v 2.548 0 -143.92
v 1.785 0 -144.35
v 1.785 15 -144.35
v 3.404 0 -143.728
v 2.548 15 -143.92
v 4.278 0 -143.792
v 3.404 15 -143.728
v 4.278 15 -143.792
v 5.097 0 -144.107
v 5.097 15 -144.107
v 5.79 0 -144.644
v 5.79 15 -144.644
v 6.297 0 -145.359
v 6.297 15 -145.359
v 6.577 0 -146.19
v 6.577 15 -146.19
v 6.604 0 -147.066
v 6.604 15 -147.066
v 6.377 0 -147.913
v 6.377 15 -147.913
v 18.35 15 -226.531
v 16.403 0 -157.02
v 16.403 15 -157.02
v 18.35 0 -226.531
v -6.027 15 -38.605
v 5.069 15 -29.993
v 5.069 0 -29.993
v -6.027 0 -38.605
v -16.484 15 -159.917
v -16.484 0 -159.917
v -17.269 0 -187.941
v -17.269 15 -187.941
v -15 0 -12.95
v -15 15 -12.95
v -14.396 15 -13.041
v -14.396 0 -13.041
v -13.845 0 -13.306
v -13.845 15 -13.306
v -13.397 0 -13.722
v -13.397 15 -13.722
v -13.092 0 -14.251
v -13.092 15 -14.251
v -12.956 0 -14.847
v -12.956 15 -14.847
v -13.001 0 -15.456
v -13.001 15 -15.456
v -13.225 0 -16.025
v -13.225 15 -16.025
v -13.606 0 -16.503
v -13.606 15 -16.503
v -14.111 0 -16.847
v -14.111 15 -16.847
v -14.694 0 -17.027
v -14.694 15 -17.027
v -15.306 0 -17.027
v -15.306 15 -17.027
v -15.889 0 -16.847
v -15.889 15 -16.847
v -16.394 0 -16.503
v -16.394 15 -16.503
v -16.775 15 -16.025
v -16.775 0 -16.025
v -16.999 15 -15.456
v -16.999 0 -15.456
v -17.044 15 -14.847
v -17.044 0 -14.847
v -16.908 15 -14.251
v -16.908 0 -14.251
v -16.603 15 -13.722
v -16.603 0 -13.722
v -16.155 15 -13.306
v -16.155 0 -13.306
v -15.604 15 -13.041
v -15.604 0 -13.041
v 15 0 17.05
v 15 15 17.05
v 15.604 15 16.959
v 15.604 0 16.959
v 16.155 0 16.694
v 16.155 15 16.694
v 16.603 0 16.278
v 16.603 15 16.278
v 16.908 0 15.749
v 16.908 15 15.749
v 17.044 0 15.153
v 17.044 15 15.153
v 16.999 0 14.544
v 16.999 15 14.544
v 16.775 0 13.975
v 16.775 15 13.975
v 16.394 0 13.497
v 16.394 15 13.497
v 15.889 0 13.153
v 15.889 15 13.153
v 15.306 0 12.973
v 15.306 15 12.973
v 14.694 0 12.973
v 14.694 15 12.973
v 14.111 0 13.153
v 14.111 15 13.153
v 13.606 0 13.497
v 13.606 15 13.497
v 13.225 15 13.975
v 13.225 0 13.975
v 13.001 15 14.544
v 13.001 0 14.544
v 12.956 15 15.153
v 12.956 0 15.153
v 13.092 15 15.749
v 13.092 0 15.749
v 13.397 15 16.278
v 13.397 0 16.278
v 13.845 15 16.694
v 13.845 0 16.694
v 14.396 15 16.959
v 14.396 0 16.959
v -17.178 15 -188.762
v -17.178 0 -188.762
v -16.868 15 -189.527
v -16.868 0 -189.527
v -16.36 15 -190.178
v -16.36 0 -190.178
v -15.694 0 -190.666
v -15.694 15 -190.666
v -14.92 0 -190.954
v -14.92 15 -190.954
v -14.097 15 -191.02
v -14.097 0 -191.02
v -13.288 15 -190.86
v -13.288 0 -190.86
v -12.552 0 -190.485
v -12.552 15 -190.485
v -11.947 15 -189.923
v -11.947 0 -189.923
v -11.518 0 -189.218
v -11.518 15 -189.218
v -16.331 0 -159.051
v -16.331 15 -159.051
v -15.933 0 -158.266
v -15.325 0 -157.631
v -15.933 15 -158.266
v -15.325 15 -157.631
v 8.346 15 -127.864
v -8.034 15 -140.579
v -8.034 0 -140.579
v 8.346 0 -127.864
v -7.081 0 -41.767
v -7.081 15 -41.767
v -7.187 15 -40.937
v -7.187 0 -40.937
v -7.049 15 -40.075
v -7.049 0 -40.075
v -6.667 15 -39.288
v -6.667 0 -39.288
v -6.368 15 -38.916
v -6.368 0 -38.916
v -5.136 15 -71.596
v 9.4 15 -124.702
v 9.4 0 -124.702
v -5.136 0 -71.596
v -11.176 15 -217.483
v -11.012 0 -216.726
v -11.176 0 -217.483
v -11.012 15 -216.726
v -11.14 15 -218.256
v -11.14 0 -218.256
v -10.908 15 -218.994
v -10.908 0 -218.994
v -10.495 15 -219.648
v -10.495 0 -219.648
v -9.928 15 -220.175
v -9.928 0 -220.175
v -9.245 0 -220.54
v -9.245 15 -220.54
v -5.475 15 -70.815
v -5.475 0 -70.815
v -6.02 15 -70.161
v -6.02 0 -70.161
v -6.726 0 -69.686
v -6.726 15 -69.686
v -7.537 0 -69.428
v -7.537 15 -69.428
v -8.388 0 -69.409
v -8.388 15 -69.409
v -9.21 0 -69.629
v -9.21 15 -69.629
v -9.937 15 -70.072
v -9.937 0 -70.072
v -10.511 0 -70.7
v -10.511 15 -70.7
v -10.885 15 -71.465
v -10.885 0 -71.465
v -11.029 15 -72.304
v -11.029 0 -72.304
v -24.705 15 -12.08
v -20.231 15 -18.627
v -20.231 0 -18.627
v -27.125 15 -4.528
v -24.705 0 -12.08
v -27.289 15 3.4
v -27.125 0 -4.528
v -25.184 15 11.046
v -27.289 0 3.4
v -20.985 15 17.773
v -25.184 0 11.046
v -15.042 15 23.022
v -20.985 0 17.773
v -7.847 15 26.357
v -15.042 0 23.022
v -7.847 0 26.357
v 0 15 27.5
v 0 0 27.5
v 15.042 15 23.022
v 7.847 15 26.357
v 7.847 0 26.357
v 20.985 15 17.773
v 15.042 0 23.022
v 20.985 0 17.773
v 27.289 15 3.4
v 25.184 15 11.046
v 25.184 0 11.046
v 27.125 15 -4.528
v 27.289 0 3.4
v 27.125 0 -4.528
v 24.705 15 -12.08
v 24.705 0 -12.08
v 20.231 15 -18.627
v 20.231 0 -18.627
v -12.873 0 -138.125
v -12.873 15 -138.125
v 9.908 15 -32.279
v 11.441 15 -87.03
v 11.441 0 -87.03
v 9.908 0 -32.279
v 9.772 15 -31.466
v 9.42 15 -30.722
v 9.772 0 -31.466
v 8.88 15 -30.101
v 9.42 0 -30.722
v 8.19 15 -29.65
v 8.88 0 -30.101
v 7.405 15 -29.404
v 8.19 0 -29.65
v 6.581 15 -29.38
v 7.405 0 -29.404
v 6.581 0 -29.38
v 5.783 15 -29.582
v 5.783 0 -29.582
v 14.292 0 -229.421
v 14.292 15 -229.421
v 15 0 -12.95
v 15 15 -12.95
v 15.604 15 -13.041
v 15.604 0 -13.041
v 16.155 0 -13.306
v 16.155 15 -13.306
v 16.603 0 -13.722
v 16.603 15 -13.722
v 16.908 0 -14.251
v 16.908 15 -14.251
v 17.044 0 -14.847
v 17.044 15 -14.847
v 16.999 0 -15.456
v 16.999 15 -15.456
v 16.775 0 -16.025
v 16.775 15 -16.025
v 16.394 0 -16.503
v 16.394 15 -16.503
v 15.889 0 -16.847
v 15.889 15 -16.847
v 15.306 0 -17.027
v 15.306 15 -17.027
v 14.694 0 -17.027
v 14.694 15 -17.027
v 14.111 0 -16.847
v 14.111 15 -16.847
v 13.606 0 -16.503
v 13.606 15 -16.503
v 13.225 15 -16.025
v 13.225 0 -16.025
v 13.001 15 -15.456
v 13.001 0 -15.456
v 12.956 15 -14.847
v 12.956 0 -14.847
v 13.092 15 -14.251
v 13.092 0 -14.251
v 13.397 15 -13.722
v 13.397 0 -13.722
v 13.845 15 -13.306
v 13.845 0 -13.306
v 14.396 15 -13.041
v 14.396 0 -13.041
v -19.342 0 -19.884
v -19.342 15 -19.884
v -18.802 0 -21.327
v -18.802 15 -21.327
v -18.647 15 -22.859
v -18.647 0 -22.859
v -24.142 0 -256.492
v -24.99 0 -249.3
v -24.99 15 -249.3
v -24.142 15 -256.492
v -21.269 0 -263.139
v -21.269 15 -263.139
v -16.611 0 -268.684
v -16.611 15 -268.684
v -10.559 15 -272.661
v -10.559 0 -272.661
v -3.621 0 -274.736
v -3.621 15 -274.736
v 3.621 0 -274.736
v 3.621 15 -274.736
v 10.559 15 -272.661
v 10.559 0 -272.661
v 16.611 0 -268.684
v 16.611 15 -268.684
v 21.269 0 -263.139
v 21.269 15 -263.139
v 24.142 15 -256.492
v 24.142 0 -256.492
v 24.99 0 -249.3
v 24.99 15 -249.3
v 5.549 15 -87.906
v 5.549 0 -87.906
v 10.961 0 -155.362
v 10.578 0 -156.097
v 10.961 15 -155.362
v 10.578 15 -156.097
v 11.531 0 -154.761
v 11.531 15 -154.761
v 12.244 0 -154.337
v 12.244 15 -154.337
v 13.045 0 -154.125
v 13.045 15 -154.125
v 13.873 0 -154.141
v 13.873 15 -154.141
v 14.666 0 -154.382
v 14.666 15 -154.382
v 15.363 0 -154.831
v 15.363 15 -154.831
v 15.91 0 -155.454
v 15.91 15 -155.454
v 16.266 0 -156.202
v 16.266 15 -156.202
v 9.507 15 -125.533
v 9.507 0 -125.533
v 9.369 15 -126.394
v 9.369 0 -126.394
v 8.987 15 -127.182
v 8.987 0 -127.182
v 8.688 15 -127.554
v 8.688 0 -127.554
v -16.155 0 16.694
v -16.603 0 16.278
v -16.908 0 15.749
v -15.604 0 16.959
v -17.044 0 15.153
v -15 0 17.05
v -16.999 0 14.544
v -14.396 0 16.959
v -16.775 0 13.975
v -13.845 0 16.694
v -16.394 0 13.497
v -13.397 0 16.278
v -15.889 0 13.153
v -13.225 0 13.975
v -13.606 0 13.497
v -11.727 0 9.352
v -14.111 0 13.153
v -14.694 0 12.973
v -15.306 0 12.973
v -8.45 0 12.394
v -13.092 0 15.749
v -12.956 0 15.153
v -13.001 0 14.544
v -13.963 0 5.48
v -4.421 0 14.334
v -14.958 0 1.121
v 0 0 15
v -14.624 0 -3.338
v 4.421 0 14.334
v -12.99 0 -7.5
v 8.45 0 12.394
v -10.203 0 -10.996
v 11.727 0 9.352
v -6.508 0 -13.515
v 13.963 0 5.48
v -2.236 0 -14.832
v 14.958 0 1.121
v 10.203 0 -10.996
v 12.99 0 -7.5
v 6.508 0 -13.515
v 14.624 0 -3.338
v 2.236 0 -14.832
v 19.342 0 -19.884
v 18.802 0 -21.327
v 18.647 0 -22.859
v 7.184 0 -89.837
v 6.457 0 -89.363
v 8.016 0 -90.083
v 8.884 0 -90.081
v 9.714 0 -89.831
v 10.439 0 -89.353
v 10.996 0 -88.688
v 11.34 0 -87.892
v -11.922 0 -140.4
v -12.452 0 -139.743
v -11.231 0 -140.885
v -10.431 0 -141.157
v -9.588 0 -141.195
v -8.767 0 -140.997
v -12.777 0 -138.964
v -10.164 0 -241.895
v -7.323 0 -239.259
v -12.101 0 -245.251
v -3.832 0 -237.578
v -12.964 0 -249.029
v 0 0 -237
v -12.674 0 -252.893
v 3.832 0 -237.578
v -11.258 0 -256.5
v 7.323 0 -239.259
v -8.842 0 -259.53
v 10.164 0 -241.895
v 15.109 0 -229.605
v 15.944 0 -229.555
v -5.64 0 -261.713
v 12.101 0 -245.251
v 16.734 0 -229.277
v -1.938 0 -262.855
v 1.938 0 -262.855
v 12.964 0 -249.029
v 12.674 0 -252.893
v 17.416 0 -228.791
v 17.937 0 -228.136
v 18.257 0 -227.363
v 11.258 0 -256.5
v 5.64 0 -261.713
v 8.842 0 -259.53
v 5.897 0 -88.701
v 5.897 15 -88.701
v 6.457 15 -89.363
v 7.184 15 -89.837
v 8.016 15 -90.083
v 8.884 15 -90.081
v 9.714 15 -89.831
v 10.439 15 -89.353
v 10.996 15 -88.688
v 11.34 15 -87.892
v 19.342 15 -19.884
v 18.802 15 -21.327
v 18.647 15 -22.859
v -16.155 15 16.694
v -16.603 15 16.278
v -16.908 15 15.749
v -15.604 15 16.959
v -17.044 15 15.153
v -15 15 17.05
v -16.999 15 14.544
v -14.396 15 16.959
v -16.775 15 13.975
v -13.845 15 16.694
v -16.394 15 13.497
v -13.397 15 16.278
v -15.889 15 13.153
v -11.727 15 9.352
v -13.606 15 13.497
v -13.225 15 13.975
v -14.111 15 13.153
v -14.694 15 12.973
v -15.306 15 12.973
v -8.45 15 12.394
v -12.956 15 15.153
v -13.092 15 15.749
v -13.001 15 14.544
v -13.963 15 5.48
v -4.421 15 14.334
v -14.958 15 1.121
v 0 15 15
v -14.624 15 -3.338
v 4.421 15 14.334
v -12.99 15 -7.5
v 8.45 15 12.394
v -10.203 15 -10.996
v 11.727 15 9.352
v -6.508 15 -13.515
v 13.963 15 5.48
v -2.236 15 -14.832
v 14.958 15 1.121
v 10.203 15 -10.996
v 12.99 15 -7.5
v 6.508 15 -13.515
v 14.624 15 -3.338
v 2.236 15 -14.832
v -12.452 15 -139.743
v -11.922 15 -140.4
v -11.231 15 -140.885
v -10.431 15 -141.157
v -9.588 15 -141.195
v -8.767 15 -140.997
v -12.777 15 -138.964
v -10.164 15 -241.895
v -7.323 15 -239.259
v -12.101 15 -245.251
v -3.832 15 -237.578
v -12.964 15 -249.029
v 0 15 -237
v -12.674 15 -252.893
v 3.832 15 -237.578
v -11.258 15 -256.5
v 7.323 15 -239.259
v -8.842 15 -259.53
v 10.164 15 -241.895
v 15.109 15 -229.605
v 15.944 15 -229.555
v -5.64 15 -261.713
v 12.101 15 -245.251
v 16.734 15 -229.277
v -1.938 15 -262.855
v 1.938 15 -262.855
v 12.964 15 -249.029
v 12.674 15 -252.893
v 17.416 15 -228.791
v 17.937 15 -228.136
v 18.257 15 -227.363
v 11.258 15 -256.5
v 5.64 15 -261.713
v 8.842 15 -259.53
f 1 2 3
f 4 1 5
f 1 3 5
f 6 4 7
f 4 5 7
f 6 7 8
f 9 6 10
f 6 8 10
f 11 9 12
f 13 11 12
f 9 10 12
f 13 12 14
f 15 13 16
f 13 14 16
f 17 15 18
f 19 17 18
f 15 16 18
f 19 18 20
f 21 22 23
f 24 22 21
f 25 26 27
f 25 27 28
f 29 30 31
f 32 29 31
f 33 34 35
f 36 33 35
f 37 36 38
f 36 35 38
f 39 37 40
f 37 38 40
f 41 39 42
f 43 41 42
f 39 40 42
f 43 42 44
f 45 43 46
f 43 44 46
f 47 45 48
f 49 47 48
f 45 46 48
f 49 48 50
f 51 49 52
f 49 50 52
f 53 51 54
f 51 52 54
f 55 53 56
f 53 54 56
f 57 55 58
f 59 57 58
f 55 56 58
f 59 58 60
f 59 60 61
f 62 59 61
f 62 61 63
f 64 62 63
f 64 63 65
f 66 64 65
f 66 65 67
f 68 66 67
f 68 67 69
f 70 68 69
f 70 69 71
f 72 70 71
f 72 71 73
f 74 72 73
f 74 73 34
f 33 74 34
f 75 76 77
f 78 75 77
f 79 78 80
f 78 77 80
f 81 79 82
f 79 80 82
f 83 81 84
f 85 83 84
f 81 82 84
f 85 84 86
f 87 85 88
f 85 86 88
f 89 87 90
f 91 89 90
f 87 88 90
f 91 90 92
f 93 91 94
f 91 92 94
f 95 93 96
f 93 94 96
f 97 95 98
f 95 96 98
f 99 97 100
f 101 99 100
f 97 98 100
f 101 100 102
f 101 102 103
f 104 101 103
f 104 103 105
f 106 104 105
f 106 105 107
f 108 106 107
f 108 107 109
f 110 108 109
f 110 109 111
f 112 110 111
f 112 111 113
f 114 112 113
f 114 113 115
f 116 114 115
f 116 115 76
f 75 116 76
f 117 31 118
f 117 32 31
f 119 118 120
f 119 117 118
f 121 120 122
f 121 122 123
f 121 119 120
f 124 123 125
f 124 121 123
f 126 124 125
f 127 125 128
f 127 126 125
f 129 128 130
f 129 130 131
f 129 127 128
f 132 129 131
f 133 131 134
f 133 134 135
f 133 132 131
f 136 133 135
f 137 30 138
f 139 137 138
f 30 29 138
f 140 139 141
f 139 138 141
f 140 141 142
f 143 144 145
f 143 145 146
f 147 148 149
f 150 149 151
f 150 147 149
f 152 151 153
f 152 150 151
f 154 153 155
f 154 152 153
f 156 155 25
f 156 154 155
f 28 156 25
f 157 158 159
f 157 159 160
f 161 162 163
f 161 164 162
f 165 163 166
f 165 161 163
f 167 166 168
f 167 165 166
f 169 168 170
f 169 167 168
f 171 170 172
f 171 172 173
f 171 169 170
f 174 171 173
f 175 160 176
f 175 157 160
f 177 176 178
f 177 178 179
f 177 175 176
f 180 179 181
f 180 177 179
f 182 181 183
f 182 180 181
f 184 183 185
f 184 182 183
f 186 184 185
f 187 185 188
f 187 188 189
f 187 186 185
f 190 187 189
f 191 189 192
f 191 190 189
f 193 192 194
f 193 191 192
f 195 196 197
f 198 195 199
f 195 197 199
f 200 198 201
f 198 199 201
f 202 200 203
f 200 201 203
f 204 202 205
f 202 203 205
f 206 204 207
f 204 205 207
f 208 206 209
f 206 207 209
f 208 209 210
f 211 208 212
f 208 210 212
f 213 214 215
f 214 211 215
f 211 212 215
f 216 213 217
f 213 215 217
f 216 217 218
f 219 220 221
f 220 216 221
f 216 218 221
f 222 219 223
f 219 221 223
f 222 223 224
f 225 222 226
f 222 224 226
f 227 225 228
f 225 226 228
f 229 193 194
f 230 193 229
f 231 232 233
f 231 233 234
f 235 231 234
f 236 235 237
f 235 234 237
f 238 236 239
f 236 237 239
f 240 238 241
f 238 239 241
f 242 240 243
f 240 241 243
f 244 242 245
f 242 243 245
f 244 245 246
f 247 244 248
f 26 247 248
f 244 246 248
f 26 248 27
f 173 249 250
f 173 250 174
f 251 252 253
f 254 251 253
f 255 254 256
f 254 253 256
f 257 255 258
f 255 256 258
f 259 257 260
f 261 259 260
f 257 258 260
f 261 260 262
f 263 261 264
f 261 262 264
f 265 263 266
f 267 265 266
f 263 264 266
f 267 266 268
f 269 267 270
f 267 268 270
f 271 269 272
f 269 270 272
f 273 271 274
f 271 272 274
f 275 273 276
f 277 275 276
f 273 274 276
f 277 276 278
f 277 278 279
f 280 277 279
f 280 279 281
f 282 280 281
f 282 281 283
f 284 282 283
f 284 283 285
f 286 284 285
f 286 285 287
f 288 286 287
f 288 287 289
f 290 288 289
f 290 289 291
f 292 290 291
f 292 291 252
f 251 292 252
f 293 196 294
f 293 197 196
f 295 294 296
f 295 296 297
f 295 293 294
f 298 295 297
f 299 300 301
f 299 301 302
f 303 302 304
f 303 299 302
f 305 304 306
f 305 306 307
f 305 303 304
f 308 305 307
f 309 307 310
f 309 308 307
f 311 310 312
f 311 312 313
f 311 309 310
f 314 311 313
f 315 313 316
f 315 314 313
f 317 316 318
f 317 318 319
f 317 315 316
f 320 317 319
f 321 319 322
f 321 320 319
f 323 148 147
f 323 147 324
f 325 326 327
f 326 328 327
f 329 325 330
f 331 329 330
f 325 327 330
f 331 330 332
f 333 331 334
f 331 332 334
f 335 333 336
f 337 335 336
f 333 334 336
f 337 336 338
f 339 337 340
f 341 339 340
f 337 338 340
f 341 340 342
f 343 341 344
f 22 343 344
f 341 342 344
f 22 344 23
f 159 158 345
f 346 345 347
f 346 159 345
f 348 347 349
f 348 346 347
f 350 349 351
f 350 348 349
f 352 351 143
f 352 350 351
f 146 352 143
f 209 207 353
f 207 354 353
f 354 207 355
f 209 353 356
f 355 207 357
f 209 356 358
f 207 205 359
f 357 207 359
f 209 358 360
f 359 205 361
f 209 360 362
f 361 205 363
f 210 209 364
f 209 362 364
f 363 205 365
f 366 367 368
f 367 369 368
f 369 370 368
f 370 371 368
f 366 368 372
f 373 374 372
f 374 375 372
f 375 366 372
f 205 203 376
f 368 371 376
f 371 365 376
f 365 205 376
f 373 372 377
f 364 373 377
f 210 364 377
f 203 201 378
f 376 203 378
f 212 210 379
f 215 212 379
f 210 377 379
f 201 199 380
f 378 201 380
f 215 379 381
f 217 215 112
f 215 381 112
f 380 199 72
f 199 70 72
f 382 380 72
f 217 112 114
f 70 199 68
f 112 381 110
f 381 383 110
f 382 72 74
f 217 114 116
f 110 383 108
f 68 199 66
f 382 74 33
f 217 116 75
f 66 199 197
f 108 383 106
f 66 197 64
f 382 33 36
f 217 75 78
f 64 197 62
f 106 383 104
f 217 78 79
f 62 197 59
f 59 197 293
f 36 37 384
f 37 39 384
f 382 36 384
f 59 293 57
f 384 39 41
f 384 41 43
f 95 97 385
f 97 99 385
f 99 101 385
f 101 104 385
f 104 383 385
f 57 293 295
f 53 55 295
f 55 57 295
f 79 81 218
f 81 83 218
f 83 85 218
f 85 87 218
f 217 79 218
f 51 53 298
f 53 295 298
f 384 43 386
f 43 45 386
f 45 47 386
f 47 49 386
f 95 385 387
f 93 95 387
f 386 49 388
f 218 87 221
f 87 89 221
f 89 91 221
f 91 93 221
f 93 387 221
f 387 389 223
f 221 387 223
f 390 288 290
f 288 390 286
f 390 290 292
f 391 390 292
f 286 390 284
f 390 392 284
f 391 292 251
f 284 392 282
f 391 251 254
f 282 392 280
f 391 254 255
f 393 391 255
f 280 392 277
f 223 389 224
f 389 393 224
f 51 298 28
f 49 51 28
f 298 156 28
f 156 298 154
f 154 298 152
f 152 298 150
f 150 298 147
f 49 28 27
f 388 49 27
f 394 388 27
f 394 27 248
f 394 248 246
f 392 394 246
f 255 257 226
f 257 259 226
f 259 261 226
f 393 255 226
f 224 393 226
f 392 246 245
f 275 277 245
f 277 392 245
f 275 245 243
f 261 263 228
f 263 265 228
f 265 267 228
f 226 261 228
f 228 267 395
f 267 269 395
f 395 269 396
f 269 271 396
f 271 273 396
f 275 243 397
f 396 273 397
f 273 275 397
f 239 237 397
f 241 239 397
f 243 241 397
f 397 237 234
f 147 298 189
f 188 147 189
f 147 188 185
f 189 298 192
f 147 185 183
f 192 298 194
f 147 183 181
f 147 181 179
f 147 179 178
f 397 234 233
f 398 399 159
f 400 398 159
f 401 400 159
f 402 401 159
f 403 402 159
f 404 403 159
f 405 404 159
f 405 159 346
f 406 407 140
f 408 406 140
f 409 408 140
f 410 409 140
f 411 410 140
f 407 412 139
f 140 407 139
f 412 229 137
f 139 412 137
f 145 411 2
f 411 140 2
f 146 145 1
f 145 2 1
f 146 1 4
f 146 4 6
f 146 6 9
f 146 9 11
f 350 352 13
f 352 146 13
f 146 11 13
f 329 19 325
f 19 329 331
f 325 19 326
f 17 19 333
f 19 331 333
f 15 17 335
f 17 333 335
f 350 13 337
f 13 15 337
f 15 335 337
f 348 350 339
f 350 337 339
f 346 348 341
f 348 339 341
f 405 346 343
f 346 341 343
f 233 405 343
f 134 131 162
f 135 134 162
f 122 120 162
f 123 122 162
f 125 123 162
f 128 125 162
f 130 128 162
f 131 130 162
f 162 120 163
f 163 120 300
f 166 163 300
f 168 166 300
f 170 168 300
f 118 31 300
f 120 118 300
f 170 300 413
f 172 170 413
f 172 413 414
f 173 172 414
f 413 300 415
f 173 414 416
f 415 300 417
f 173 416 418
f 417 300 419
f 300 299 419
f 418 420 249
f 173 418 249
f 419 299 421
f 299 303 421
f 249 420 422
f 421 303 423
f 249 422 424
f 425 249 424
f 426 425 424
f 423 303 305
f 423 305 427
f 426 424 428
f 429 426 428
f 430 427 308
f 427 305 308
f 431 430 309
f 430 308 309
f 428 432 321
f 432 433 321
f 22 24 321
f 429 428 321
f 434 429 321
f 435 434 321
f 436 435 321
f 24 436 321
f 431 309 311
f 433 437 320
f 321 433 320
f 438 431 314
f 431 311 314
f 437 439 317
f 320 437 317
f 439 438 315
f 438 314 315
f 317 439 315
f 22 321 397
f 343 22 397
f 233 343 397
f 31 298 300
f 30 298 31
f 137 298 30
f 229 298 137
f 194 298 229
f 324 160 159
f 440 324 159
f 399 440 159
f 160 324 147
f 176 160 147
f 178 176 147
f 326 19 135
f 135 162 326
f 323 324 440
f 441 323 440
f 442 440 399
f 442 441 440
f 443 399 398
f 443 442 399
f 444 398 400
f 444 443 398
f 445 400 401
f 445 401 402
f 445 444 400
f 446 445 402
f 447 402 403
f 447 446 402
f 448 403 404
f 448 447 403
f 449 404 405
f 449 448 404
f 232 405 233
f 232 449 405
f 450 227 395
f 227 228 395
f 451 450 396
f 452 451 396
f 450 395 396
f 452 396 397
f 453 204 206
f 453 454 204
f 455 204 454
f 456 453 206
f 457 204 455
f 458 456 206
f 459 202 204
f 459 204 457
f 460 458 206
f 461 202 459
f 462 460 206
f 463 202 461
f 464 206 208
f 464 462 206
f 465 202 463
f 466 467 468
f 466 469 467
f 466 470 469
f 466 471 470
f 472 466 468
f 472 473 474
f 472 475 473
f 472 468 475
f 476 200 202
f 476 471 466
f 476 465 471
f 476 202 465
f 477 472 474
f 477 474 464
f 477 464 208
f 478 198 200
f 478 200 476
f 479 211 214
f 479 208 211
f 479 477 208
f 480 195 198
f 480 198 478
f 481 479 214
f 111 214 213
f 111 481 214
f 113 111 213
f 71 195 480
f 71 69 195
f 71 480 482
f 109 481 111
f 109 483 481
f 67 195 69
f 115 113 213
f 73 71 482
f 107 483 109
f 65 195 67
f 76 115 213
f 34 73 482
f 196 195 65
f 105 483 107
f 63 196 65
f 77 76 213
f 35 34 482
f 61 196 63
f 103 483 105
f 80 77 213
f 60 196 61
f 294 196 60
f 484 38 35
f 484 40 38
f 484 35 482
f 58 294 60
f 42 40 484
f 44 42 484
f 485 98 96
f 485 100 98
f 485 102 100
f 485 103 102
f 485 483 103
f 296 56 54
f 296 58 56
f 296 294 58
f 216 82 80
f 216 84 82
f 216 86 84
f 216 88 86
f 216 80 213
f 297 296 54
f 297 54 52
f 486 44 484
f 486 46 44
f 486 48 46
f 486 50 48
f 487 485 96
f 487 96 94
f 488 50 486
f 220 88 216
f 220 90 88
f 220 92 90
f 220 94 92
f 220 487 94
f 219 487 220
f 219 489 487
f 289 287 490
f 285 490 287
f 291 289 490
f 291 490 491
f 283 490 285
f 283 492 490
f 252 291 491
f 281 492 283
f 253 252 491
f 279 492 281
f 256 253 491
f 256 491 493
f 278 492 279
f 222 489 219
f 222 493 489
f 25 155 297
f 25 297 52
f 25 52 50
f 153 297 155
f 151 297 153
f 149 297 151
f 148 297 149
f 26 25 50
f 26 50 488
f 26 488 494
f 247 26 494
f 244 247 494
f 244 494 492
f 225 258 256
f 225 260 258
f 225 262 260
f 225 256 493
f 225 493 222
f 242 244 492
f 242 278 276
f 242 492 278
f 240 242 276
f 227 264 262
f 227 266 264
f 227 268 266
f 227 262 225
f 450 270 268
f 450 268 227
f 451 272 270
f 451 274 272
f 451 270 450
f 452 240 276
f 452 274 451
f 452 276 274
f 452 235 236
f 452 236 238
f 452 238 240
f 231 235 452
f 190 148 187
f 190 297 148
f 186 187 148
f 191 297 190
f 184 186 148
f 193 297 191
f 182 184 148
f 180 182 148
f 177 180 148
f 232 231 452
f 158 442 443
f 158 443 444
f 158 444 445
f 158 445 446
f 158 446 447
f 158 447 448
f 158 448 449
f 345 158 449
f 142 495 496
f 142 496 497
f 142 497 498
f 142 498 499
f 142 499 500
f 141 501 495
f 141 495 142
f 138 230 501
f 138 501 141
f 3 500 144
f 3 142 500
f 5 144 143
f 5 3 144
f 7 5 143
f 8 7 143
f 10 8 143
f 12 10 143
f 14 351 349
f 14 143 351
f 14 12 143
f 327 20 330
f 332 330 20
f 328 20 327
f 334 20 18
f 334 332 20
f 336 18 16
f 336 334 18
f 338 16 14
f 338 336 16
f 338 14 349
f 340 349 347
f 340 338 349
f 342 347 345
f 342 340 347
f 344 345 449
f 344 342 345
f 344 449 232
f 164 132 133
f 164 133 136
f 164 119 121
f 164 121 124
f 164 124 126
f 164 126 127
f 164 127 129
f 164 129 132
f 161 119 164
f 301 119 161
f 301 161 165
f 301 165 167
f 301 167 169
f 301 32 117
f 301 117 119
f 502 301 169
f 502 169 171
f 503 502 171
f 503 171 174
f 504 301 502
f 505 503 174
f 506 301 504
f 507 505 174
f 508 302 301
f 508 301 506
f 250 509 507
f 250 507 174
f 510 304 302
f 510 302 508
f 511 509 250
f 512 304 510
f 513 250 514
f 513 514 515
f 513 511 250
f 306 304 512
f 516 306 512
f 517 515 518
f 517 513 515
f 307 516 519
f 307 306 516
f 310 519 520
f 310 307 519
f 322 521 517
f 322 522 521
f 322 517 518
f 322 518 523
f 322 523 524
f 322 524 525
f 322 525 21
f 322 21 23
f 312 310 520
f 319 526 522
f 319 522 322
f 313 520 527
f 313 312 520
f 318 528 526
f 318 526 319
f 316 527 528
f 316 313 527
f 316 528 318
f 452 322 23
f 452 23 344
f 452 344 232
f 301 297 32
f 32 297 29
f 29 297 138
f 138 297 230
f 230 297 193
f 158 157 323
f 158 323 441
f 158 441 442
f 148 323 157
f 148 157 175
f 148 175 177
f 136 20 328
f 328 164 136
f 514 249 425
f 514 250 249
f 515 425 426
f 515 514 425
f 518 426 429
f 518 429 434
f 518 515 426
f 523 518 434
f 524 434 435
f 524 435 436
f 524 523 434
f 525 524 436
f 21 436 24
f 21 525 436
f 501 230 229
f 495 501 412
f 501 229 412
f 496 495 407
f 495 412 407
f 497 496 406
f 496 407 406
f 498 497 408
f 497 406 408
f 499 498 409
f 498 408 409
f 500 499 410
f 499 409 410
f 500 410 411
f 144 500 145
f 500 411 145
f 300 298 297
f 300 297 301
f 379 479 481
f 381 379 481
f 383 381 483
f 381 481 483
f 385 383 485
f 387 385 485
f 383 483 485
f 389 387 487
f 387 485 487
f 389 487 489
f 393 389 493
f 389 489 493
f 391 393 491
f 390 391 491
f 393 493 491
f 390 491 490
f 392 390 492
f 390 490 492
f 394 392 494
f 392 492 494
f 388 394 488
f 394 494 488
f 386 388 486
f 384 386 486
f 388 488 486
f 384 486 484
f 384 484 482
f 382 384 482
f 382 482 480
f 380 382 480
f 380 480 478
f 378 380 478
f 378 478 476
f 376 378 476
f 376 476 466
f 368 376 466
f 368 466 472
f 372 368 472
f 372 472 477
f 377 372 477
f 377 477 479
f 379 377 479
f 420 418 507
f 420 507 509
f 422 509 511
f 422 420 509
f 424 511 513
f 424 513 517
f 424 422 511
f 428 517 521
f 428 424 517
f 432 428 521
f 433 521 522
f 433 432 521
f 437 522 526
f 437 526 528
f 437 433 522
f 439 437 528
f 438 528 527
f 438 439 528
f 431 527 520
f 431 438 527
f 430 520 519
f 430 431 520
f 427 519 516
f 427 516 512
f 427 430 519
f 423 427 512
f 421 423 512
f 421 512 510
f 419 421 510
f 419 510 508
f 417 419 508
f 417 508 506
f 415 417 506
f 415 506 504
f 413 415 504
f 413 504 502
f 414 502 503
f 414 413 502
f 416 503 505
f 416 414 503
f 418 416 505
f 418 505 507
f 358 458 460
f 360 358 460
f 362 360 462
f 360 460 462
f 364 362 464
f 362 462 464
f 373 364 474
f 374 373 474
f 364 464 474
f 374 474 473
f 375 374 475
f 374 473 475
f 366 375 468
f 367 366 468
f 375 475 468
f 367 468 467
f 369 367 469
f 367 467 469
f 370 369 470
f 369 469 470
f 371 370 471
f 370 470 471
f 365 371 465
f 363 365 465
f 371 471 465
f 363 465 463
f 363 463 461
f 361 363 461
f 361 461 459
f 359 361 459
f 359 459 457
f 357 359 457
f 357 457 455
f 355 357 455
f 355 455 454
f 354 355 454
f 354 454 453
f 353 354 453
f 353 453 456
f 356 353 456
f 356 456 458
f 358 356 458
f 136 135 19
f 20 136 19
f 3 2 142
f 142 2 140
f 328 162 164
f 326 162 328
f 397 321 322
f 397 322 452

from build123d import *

# Parameters (mm, degrees)
SKETCH_1_R          = 5.05
SKETCH_1_R_2        = 13
EXTRUDE_1_DEPTH     = 15
FILLET_1_R          = 3
CUT_EXTRUDE_3_DEPTH = 277.54113618
FILLET_2_R          = 3
EXTRUDE_START       = -15
SKETCH_5_R          = 27.5
SKETCH_5_R_2        = 5.05
EXTRUDE_2_DEPTH     = 15
FILLET_3_R          = 6
EXTRUDE_3_DEPTH     = 15
FILLET_4_R          = 3
SKETCH_7_R          = 2.05
CUT_EXTRUDE_4_DEPTH = 277.778340916
SKETCH_8_R          = 15
CUT_EXTRUDE_5_DEPTH = 277.778340916


with BuildPart() as part:
    # 草图1 → 凸台-拉伸1 (new body)
    with BuildSketch(Plane(origin=(0, 0, 0), x_dir=(1, 0, 0), z_dir=(0, 1, 0))):
        with BuildLine():
            Line((-17.992942616, -0.504), (-24.990198078, 249.3))
            ThreePointArc((-24.990198078, 249.3), (0, 275), (24.990198078, 249.3))
            Line((24.990198078, 249.3), (17.992942616, -0.504))
            ThreePointArc((17.992942616, -0.504), (0, -18), (-17.992942616, -0.504))
        make_face()
        with Locations(Location((0, 0, 0), (0, 0, 270))):
            Circle(SKETCH_1_R, mode=Mode.SUBTRACT)
        with Locations(Location((0, 250, 0), (0, 0, 270))):
            Circle(SKETCH_1_R_2, mode=Mode.SUBTRACT)
        Polygon((-16.444447487, 158.5), (-17.704941698, 203.5), (11.028871219, 137.174942267), align=None, mode=Mode.SUBTRACT)
        Polygon((15.954255294, 141), (18.475243716, 231), (-12, 219.5), align=None, mode=Mode.SUBTRACT)
    extrude(amount=EXTRUDE_1_DEPTH)

    # 圆角1
    fillet_1_edges = [part.edges().sort_by_distance(p)[0] for p in [
        (-16.444447487, 7.5, -158.5),
        (11.028871219, 7.5, -137.174942267),
        (-17.704941698, 7.5, -203.5),
        (18.475243716, 7.5, -231),
        (-12, 7.5, -219.5),
        (15.954255294, 7.5, -141),
    ]]
    fillet(fillet_1_edges, radius=FILLET_1_R)

    # 草图4 → 切除-拉伸3 (cut, through all)
    with BuildSketch(Plane(origin=(0, 15, 0), x_dir=(1, 0, 0), z_dir=(0, 1, 0))):
        Polygon((-13.050343026, 144.472367448), (12.494927596, 124.643879429), (9.742058902, 26.365688077), (-10.175105816, 41.825585442), align=None)
    extrude(amount=-CUT_EXTRUDE_3_DEPTH, mode=Mode.SUBTRACT)

    # 圆角2
    fillet_2_edges = [part.edges().sort_by_distance(p)[0] for p in [
        (-10.175105816, 7.5, -41.825585442),
        (-13.050343026, 7.5, -144.472367448),
        (9.742058902, 7.5, -26.365688077),
    ]]
    fillet(fillet_2_edges, radius=FILLET_2_R)

    # 草图5 → 凸台-拉伸2 (add)
    with BuildSketch(Plane(origin=(0, 15, 0), x_dir=(1, 0, 0), z_dir=(0, 1, 0)).offset(EXTRUDE_START)):
        Circle(SKETCH_5_R)
        with Locations(Location((0, 0, 0), (0, 0, 270))):
            Circle(SKETCH_5_R_2, mode=Mode.SUBTRACT)
    extrude(amount=EXTRUDE_2_DEPTH)

    # 圆角3
    fillet_3_edges = [part.edges().sort_by_distance(p)[0] for p in [
        (-18.575080057, 7.5, -20.278471364),
        (18.575080057, 7.5, -20.278471364),
    ]]
    fillet(fillet_3_edges, radius=FILLET_3_R)

    # 草图6 → 凸台-拉伸3 (add)
    with BuildSketch(Plane(origin=(0, 15, 0), x_dir=(1, 0, 0), z_dir=(0, 1, 0))):
        Polygon((9.60137553, 125.435937788), (-13.068657882, 42.617643801), (-7.609801347, 39.834371112), (-7.28155375, 41.033527083), (15.388479662, 123.85182107), (9.929623127, 126.635093759), align=None)
    extrude(amount=-EXTRUDE_3_DEPTH)

    # 圆角4
    fillet_4_edges = [part.edges().sort_by_distance(p)[0] for p in [
        (9.929623127, 7.5, -126.635093759),
        (12.14036175, 7.5, -111.985778385),
        (-7.609801347, 7.5, -39.834371112),
        (-10.463842583, 7.5, -52.133569747),
    ]]
    fillet(fillet_4_edges, radius=FILLET_4_R)

    # 草图7 → 切除-拉伸4 (cut, through all)
    with BuildSketch(Plane(origin=(0, 15, 0), x_dir=(1, 0, 0), z_dir=(0, 1, 0))):
        with Locations(Location((15, 15, 0), (0, 0, 270))):
            Circle(SKETCH_7_R)
        with Locations(Location((-15, 15, 0), (0, 0, 270))):
            Circle(SKETCH_7_R)
        with Locations(Location((-15, -15, 0), (0, 0, 270))):
            Circle(SKETCH_7_R)
        with Locations(Location((15, -15, 0), (0, 0, 270))):
            Circle(SKETCH_7_R)
    extrude(amount=-CUT_EXTRUDE_4_DEPTH, mode=Mode.SUBTRACT)

    # 草图8 → 切除-拉伸5 (cut, through all)
    with BuildSketch(Plane(origin=(0, 15, 0), x_dir=(1, 0, 0), z_dir=(0, 1, 0))):
        with Locations(Location((0, 0, 0), (0, 0, 270))):
            Circle(SKETCH_8_R)
    extrude(amount=-CUT_EXTRUDE_5_DEPTH, mode=Mode.SUBTRACT)


solid = part.part
